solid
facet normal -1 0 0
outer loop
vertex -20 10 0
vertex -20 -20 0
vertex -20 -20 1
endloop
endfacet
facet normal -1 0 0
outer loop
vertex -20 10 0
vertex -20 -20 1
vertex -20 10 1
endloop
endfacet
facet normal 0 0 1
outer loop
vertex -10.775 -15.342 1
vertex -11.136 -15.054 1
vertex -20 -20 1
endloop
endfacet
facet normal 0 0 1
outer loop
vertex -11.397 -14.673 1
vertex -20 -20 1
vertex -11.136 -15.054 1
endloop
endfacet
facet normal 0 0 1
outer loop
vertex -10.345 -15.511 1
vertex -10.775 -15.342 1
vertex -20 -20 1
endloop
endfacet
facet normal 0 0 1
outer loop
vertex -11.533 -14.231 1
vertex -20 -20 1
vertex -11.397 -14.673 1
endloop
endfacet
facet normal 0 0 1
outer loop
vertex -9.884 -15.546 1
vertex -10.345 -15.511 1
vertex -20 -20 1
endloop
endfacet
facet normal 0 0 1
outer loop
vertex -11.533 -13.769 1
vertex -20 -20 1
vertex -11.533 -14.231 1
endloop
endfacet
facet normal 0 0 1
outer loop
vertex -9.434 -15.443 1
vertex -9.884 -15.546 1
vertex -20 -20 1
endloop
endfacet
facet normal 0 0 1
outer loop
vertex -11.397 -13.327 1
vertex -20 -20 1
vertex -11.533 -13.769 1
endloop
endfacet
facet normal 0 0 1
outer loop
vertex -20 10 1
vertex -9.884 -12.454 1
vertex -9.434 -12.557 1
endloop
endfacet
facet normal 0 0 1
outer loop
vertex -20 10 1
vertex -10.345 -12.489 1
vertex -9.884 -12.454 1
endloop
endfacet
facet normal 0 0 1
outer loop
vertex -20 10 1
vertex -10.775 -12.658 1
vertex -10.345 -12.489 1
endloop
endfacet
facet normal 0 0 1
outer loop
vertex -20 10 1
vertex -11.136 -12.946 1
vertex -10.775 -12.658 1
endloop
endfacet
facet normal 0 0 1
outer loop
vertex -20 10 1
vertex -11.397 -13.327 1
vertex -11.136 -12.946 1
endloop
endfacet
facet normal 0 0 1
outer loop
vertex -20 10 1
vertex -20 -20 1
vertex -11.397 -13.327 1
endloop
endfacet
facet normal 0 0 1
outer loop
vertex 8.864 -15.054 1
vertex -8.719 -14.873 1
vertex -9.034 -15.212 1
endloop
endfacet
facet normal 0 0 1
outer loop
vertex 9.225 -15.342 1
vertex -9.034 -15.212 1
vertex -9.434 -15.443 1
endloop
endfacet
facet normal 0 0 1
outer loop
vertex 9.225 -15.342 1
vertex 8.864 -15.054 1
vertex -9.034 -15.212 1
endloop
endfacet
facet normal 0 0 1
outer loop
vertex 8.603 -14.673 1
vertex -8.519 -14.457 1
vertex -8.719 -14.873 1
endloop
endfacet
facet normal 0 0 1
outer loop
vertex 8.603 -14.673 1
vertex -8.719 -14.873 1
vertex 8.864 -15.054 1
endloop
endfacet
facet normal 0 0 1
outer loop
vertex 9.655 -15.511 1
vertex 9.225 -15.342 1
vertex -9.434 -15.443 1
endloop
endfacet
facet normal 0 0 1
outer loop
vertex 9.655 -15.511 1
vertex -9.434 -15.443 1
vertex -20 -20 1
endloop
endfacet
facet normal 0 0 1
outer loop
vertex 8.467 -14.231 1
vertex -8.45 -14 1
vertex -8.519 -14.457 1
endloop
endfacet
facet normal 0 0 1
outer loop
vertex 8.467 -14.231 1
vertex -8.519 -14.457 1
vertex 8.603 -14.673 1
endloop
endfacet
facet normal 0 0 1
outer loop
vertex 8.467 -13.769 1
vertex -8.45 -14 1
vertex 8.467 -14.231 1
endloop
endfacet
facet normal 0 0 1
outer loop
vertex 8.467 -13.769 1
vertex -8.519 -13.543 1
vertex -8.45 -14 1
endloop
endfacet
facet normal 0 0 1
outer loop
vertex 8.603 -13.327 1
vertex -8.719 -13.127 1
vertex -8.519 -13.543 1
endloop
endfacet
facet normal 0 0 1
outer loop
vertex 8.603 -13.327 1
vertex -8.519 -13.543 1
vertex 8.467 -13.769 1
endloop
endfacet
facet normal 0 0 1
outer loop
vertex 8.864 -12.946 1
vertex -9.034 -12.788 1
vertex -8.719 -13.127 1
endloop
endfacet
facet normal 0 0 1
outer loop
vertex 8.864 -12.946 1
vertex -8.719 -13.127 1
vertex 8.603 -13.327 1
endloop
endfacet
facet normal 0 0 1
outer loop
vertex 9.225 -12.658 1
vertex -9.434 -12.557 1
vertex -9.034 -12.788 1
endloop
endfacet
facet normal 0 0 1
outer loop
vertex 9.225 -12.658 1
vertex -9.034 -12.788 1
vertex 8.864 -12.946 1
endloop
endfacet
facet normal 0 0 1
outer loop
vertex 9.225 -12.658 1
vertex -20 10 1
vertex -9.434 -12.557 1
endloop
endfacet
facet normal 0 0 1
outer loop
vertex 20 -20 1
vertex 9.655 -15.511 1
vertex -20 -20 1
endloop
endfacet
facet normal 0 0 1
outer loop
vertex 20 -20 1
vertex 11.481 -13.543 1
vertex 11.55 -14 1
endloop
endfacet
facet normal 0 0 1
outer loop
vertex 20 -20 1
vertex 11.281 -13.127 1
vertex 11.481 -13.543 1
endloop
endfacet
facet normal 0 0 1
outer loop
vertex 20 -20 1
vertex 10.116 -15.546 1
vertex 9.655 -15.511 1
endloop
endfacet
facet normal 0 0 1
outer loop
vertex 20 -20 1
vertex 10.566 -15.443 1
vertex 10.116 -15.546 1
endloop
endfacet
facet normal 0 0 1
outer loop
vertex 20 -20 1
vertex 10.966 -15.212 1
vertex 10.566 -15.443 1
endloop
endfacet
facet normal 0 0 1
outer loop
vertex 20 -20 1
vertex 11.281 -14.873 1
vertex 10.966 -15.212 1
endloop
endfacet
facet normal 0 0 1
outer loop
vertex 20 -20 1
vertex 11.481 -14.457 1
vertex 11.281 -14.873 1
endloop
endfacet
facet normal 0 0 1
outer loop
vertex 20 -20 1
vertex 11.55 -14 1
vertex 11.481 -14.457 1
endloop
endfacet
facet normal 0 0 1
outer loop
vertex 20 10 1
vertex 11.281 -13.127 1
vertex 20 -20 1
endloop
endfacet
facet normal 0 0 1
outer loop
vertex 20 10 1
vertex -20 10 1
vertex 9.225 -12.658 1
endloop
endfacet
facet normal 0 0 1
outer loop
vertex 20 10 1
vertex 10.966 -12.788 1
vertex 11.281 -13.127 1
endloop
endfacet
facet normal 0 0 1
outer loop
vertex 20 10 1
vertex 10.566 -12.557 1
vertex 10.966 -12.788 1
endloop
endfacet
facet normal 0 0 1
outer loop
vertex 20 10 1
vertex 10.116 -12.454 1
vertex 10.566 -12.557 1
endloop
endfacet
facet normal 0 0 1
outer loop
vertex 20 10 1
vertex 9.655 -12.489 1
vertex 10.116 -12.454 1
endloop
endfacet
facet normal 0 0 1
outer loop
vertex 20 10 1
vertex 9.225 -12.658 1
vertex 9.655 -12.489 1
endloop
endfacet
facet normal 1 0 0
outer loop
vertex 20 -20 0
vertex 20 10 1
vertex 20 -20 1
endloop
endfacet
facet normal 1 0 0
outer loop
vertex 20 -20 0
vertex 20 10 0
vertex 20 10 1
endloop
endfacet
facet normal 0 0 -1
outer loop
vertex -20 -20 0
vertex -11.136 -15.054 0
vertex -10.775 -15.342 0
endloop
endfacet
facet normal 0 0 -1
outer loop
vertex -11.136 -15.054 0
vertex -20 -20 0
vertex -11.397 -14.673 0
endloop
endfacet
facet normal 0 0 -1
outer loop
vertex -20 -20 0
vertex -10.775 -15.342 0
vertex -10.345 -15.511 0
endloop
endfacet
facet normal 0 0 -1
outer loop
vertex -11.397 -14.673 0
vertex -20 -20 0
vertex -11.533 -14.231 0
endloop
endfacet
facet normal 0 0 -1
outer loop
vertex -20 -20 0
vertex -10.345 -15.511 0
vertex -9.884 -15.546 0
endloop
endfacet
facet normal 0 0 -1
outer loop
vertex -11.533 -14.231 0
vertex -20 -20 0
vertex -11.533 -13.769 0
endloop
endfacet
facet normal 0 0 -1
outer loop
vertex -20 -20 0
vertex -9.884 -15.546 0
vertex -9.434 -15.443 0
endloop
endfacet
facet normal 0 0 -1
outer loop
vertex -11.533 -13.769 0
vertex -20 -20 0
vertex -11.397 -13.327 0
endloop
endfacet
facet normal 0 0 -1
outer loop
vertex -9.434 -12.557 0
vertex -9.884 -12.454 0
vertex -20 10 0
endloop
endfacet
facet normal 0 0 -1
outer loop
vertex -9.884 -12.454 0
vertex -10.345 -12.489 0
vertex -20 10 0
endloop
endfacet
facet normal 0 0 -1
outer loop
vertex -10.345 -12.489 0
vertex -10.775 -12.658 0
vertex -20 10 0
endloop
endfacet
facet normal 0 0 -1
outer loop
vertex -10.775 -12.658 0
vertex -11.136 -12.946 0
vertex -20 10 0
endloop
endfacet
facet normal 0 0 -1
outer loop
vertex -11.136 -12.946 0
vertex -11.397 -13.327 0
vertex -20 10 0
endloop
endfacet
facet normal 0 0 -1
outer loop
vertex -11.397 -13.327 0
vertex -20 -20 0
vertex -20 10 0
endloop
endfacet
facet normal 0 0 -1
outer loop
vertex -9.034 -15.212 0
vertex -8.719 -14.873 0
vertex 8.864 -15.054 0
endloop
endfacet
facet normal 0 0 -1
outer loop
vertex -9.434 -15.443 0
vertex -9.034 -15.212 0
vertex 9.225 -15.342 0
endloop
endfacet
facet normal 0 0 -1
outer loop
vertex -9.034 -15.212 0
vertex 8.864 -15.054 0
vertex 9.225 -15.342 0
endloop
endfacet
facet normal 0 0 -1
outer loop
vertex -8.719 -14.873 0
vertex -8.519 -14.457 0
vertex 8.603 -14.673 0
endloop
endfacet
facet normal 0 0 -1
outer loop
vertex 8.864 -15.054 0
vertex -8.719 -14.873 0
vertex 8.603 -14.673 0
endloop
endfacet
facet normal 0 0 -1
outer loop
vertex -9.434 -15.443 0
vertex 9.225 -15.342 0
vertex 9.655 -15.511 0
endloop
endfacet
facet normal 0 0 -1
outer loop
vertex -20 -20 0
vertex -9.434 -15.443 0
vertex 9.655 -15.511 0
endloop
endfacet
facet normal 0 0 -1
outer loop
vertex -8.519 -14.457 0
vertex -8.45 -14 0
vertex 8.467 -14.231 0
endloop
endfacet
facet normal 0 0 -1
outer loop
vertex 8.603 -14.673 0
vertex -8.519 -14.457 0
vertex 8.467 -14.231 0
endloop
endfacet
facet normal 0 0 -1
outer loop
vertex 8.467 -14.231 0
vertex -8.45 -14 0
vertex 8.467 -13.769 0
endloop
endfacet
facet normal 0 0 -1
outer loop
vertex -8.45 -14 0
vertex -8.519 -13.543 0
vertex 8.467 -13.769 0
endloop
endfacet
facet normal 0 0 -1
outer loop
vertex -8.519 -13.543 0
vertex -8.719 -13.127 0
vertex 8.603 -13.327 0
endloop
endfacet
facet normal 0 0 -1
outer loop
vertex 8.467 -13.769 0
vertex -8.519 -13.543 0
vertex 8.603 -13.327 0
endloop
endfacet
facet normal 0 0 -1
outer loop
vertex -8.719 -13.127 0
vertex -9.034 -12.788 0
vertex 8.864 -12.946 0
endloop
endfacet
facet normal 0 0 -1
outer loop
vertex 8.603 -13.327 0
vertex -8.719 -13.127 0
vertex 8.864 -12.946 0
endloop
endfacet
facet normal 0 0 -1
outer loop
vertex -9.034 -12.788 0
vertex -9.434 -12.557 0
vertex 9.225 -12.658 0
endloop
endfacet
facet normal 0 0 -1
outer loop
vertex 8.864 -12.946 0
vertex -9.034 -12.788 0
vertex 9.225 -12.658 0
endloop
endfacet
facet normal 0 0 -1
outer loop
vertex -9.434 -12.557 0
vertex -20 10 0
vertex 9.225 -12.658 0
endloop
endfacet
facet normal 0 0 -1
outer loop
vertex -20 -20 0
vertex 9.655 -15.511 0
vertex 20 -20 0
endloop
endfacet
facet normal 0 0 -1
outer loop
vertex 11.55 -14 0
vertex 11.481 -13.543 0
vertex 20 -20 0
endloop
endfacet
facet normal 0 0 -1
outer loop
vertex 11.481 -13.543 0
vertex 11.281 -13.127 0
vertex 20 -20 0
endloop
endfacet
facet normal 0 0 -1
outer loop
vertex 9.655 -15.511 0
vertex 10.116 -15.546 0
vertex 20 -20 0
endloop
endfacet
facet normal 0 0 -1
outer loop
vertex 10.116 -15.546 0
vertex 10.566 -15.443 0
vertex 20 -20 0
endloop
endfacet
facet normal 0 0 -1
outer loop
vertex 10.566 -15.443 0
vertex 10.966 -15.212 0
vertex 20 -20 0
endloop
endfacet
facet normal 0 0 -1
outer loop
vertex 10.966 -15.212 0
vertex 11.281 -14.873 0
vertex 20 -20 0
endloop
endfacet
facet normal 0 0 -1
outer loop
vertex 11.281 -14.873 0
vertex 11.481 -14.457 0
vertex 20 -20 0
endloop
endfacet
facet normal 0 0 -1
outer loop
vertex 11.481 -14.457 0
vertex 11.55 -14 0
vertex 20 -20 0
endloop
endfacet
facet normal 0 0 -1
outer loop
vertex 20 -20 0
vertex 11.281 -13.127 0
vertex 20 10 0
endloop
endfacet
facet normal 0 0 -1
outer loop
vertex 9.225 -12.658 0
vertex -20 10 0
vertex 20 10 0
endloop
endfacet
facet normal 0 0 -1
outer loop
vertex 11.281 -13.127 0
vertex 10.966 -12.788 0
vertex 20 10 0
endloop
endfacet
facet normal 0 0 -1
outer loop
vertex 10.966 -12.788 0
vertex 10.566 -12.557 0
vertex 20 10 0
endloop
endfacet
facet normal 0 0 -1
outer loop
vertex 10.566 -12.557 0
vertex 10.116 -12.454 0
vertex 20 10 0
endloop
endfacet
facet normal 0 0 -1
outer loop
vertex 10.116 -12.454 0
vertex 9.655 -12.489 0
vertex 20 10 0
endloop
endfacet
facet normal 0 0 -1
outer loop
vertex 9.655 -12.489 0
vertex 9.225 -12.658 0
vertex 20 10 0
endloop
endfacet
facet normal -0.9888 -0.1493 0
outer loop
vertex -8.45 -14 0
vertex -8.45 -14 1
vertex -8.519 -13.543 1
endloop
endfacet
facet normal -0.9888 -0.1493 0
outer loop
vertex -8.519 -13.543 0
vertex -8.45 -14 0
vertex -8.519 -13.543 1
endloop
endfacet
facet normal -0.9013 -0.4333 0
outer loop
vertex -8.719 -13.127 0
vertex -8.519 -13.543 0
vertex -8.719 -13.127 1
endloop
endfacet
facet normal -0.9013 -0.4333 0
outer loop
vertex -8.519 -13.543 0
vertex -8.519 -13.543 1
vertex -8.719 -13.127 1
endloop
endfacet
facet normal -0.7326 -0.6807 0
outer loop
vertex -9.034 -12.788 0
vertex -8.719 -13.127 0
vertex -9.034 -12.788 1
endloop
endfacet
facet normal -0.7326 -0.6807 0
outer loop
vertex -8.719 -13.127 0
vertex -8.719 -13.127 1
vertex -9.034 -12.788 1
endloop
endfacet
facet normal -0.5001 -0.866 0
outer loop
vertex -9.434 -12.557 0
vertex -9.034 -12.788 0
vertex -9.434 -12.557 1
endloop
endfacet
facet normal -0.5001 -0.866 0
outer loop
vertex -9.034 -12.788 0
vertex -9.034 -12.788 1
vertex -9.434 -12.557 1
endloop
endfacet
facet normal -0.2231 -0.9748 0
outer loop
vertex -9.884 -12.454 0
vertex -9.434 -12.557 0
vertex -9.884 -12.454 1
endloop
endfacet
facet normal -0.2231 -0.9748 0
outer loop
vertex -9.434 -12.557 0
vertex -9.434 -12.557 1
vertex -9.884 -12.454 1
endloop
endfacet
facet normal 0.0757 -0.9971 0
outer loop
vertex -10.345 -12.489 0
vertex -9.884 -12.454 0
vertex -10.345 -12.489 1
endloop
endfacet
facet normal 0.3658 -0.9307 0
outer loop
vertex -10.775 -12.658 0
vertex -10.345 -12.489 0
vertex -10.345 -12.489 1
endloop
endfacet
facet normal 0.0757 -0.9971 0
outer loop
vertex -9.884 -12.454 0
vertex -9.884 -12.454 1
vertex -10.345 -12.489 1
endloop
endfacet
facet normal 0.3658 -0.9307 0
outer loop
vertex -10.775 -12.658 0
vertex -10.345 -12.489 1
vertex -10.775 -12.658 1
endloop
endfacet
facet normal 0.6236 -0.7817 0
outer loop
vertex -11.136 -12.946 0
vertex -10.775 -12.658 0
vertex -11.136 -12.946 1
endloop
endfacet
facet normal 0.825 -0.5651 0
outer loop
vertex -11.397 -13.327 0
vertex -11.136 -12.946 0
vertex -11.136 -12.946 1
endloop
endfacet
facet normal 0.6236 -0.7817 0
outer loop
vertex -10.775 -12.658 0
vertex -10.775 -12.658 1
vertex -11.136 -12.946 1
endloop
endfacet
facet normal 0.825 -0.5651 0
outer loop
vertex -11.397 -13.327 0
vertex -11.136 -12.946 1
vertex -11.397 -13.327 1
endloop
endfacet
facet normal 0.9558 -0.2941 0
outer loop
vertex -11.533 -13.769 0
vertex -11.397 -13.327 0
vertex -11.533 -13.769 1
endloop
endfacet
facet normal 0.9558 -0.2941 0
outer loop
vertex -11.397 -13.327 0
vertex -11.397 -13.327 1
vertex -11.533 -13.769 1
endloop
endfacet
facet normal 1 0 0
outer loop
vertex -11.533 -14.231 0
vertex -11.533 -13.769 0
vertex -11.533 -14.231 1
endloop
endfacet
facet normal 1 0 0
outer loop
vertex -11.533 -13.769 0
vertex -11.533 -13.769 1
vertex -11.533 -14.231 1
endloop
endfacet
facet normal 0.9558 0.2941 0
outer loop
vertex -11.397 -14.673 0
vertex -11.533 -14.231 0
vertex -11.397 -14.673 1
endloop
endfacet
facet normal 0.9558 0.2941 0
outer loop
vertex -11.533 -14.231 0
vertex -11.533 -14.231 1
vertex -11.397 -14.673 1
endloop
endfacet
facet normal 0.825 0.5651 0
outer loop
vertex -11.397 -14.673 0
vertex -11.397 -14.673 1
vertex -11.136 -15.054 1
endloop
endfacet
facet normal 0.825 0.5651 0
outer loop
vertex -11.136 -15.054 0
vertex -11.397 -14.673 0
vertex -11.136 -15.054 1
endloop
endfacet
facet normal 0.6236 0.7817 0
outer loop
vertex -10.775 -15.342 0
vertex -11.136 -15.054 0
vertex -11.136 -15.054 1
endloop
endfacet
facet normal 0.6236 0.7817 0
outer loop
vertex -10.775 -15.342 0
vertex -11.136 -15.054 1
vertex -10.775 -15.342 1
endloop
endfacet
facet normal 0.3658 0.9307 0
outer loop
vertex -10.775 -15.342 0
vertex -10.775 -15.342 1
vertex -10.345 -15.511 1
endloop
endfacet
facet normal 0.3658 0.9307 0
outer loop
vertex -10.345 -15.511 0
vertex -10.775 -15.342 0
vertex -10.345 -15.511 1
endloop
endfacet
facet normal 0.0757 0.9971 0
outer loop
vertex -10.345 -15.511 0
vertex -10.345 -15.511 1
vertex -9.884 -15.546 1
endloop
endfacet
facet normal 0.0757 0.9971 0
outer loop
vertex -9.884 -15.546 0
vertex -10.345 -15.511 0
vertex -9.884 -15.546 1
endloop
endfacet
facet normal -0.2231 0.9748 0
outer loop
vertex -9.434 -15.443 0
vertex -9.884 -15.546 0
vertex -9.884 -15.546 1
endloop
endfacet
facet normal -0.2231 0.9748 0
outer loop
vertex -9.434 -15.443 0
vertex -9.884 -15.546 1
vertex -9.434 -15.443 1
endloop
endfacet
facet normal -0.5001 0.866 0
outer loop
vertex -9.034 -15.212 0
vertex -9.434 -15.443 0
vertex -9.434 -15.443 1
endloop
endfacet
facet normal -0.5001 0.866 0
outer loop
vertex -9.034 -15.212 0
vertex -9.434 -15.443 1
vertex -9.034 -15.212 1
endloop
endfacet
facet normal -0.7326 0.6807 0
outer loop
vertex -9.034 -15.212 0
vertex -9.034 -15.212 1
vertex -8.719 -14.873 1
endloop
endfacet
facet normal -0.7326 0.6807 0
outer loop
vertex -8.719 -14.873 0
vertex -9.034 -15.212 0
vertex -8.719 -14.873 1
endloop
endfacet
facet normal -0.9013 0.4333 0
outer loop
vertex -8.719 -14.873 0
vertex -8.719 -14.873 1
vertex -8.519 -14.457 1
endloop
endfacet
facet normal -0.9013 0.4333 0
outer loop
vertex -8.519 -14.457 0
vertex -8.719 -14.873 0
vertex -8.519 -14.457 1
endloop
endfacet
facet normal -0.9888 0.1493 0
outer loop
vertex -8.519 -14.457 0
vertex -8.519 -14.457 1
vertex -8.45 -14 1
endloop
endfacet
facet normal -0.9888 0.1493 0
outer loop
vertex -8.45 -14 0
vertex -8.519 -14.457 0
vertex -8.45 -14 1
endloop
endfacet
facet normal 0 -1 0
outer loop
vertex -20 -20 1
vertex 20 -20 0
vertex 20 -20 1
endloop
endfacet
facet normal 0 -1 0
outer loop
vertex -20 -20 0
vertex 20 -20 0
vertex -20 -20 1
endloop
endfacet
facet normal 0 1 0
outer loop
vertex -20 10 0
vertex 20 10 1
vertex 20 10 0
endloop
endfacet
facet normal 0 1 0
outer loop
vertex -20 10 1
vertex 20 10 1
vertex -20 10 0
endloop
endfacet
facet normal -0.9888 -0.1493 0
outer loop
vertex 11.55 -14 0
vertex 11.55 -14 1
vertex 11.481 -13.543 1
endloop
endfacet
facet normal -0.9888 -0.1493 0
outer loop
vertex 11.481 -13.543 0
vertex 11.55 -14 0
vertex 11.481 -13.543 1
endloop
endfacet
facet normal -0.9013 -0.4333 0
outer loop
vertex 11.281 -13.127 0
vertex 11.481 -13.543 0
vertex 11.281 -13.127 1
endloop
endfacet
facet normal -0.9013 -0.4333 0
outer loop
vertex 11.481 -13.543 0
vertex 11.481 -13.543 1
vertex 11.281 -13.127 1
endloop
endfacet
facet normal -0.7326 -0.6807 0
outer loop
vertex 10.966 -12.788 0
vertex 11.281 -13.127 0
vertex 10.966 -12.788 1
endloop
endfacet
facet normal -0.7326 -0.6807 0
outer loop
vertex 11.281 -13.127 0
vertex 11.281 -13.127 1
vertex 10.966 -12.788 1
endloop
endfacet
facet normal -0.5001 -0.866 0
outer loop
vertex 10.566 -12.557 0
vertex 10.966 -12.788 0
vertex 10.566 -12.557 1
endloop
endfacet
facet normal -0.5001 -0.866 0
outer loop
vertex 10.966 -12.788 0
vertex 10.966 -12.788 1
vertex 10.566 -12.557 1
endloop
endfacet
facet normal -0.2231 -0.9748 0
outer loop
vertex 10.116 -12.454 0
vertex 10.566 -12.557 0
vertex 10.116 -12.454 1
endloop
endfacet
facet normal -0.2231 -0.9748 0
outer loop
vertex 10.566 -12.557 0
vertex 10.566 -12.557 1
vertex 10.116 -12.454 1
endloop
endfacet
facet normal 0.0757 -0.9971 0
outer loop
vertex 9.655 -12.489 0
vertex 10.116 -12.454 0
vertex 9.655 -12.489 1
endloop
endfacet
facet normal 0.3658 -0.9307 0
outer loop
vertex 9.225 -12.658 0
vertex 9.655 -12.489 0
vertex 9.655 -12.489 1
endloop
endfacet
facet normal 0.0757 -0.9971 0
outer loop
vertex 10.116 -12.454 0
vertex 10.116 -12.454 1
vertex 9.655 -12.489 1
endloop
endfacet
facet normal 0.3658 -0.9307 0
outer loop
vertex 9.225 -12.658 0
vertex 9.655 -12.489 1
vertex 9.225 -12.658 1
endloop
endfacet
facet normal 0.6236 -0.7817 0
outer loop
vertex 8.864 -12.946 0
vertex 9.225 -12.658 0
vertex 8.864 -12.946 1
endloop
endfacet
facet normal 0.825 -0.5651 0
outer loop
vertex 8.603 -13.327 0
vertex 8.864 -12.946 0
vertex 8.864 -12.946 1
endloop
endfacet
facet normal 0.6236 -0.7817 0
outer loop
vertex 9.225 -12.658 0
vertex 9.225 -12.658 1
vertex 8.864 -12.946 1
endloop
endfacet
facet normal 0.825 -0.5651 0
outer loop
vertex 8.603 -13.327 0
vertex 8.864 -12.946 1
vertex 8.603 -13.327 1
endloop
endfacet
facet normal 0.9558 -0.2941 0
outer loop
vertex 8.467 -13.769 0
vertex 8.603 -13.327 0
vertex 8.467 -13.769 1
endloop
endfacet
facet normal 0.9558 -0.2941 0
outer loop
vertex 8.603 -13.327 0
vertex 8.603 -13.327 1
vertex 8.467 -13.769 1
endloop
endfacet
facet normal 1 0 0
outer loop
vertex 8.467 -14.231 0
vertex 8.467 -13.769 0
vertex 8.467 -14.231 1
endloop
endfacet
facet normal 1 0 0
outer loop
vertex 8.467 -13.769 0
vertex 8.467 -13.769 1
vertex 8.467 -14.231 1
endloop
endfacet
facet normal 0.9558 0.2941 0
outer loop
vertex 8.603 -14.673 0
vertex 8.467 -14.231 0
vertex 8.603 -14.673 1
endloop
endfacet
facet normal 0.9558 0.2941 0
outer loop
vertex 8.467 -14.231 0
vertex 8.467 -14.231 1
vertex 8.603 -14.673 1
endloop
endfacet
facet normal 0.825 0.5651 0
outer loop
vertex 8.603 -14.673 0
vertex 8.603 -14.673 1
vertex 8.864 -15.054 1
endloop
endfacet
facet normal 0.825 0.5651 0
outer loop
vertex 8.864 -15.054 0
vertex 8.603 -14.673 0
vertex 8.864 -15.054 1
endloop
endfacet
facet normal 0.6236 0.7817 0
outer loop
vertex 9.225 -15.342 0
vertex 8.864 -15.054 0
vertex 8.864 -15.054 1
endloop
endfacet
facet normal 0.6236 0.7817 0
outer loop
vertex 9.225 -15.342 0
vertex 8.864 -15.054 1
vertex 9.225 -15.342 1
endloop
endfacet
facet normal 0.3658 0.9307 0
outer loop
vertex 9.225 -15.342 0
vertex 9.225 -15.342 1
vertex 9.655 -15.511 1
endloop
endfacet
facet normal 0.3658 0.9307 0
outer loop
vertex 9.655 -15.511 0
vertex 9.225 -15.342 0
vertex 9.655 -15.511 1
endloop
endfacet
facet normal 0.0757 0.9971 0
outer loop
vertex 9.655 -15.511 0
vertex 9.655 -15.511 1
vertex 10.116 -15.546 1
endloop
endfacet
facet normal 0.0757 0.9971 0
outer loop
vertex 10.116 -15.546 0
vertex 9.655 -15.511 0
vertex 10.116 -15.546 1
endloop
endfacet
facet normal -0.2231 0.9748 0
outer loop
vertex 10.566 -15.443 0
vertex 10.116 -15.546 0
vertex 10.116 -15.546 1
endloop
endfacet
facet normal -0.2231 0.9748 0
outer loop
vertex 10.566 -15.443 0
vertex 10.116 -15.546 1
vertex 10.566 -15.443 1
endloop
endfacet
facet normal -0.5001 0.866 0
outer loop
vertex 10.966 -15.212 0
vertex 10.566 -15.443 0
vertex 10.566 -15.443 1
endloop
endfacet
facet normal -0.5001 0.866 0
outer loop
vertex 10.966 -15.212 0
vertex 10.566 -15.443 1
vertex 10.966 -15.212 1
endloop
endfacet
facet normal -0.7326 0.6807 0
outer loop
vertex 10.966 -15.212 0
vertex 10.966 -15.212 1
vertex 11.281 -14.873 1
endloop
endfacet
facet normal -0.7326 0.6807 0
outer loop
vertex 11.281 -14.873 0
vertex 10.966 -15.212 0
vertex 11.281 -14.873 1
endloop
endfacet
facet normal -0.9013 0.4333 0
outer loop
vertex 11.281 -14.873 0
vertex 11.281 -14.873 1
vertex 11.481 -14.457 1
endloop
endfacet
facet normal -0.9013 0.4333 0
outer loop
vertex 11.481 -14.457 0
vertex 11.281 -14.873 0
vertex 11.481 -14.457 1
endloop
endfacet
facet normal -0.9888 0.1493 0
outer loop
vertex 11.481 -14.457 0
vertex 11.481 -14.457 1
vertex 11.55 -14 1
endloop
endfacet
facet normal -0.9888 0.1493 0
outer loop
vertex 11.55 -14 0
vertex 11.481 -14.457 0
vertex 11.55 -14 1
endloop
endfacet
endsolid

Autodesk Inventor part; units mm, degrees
ref_plane "YZ Plane" through (0, 0, 0) normal (1, 0, 0) x (0, 1, 0)
ref_plane "XZ Plane" through (0, 0, 0) normal (0, 1, 0) x (-1, 0, 0)
ref_plane "XY Plane" through (0, 0, 0) normal (0, 0, 1) x (1, 0, 0)
sketch "スケッチ1" plane through (0, 0, 0) normal (0, 0, 1) x (1, 0, 0)
  line L0 (-20, 20) -> (20, 20)
  line L1 (20, 20) -> (20, -20)
  line L2 (20, -20) -> (-20, -20)
  line L3 (-20, -20) -> (-20, 20)
  line L4 (-20, 20) -> (20, -20) construction
  line L5 (20, 20) -> (-20, -20) construction
  point P0 (0, 0)
  dimension "d0" = 40
  dimension "d1" = 40
extrude "押し出し1" add sketch "スケッチ1" along normal blind 1
sketch "スケッチ2" plane through (0, 0, 1) normal (0, 0, 1) x (1, 0, 0)
  line L0 (-20, 20) -> (-20, -20) projected
  line L1 (20, -20) -> (20, 20) projected
  line L2 (-20, -20) -> (20, -20) projected
  circle A0 centre (-10, -14) radius 1.55
  circle A1 centre (10, -14) radius 1.55
  point P0 (0, 0)
  dimension "d4" = 10
  dimension "d5" = 10
  dimension "d6" = 6
  dimension "d7" = 6
  dimension "d8" = 3.1
  dimension "d9" = 3.1
extrude "押し出し2" cut sketch "スケッチ2" against normal blind 1
sketch "スケッチ3" plane through (0, 0, 1) normal (0, 0, 1) x (1, 0, 0)
  line L0 (-20, 20) -> (20, 20)
  line L1 (20, 20) -> (20, 10)
  line L2 (20, 10) -> (-20, 10)
  line L3 (-20, 10) -> (-20, 20)
  line L4 (20, -20) -> (20, 20) projected
  line L5 (20, 20) -> (-20, 20) projected
  point P0 (0, 0)
  dimension "d12" = 40
  dimension "d13" = 10
  dimension "d14" = 0
  dimension "d15" = 0
extrude "押し出し3" cut sketch "スケッチ3" against normal blind 1
properties part number "gard"
